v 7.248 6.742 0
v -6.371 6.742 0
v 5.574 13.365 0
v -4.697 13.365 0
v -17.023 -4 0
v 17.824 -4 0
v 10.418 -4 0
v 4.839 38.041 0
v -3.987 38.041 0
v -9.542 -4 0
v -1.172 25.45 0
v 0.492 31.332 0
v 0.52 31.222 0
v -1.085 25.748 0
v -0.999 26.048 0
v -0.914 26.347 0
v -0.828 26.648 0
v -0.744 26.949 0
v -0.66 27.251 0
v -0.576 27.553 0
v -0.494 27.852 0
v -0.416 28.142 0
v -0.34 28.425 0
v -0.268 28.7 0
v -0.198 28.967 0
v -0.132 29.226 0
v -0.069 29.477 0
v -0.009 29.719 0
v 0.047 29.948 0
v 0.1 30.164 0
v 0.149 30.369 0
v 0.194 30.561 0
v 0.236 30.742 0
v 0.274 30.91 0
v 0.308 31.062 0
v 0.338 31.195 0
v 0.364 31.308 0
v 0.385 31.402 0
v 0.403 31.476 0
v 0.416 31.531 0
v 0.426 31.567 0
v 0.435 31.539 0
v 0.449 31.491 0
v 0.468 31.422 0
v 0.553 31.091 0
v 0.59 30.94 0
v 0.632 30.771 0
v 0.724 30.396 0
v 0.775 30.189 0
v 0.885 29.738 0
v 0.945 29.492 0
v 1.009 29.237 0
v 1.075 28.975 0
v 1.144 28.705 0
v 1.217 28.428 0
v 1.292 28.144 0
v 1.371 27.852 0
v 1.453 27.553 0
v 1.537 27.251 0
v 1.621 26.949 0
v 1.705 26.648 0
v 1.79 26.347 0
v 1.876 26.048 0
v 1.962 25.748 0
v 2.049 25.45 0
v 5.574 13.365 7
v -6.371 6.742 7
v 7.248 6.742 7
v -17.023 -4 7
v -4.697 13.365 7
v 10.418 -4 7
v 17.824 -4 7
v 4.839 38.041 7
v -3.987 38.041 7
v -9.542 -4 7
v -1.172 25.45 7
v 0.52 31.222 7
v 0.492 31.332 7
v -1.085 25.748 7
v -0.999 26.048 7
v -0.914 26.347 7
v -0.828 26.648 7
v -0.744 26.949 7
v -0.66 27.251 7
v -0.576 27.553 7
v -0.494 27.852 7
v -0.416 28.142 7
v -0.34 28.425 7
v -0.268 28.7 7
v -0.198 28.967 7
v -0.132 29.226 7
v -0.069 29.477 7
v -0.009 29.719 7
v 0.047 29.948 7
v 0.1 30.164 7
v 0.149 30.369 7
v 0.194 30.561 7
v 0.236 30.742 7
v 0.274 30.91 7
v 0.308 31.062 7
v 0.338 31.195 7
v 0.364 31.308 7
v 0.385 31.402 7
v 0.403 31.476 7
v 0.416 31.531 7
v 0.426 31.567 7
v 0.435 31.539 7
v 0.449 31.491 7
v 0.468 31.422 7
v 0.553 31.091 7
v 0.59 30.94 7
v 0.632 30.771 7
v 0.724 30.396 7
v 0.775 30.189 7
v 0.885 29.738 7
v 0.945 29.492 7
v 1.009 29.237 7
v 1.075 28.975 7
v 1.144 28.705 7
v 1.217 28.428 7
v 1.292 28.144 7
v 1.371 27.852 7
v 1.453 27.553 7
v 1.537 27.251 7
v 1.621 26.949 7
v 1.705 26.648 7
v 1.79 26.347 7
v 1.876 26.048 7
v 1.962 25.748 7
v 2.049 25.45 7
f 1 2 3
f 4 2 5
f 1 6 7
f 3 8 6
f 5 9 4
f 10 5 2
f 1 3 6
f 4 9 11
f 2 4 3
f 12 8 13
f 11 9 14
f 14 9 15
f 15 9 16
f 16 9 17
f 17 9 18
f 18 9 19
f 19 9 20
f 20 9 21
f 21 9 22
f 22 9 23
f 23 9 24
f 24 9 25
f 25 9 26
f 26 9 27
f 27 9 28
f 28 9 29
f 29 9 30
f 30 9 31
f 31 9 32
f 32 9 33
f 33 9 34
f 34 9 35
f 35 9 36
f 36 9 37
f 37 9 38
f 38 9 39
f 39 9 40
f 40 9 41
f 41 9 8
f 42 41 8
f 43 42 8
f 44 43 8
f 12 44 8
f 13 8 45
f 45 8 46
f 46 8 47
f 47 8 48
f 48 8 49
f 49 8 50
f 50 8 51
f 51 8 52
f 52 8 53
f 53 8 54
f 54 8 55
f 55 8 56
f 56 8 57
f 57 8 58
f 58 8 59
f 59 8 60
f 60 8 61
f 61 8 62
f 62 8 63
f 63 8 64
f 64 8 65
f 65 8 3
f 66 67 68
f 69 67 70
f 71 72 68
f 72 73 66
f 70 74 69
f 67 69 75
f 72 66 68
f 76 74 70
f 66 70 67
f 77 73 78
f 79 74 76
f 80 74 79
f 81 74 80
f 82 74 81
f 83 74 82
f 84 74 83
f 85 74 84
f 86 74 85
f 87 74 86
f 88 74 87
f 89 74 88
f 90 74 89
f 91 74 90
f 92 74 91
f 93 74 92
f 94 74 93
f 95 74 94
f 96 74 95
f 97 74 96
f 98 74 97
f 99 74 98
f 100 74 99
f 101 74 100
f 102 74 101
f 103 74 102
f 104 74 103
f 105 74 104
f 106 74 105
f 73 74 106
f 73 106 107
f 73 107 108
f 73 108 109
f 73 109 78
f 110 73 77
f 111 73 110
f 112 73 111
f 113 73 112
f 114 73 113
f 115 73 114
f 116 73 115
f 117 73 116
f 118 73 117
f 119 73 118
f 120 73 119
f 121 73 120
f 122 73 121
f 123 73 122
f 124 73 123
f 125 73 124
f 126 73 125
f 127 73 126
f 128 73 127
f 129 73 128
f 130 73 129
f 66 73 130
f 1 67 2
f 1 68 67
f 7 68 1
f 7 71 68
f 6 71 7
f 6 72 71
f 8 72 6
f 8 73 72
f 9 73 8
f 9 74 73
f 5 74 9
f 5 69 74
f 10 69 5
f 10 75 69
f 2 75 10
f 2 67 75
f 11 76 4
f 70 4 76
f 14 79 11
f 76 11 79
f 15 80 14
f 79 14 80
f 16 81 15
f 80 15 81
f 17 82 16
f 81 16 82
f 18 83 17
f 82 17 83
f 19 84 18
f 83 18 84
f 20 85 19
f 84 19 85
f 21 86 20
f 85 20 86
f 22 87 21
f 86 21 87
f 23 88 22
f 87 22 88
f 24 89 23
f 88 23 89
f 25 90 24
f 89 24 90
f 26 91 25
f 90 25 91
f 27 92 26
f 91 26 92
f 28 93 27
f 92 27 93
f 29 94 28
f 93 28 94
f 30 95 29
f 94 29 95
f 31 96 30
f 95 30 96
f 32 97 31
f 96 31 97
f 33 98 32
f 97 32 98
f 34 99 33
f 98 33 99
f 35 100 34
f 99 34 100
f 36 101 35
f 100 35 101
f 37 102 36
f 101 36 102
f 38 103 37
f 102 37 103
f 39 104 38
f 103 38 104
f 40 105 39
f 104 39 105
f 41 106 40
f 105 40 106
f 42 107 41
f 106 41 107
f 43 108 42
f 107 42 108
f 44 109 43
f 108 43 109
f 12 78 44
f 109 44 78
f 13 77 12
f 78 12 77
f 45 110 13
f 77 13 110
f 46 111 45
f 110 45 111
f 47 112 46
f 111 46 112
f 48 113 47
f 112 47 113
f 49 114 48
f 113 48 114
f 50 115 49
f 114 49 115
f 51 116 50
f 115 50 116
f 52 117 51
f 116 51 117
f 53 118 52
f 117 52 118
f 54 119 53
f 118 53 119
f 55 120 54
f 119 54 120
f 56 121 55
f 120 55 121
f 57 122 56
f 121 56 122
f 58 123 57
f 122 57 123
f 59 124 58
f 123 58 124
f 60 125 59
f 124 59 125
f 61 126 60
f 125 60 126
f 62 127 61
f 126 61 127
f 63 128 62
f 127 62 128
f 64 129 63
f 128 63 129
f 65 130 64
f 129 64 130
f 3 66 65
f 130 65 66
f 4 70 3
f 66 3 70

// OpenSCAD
// file: glyph.scad
// glyph — the shared geometry of every letter in the set. Defines named geometry
// only, so it renders nothing on its own; each letter part includes it and calls
// letter(). Every dimension lives in ../../lib/common.scad.
//
// A LETTER IS NOTHING BUT A LETTER. No plinth, no tongue, no tab — it is the
// bare glyph, and it attaches by standing in the deck groove and resting on the
// groove's floor. Anything else on it would be a distraction on a learning toy.
//
// It is a flat plate of one thickness, printed face-down: no overhang anywhere,
// no supports, and the face on the bed comes out smoothest.
//
// TWO TRAPS WITH text():
//
//  * A missing font FALLS BACK SILENTLY — no warning, no error, just different
//    letters. "Liberation Sans" was the first choice here because OpenSCAD
//    bundles it; on macOS the bundled faces are not registered with fontconfig,
//    so it rendered the fallback face instead and nothing said so. To check a
//    font resolved, render a string with it and with a deliberately bogus name
//    and compare bounding boxes: identical means it fell back.
//  * `size` is not the cap height in general. For Helvetica Bold they coincide
//    (size 44 -> 44.0 mm cap), which is why letter_size reads as a height.
//    Change the font and re-measure.

include <../../lib/common.scad>

// The letter's outline, upright in the XY plane, ready to be extruded along Z
// (which is the letter's thickness, and the print's build axis).
//
//   y = 0   is the deck surface
//   y < 0   is the part standing down inside the groove. It reaches letter_bury,
//           which is where the tapered groove closes to letter_t — NOT the
//           groove's floor. The letter wedges; it never bottoms out.
module glyph_2d(ch) {
    intersection() {
        translate([0, -letter_bury])
            scale([letter_condense, 1])
                text(ch, size = letter_size, font = letter_font,
                     halign = "center", valign = "baseline");
        // Trimmed flat at the baseline. Round letters (O, C, G, S) overshoot the
        // baseline by design, and a letter standing on a convex curve rocks —
        // there is nothing to stop it leaning. The trim costs nothing visible
        // and gives every letter a flat foot on the groove floor.
        translate([-200, -letter_bury]) square([400, 400]);
    }
}

// One letter, in its print orientation: lying on its face, thickness up Z.
module letter(ch) {
    linear_extrude(letter_t) glyph_2d(ch);
}

// Where that letter sits once it is dropped into a chassis, for fit checks.
module letter_fitted(ch) {
    translate([0, letter_t/2, body_top]) rotate([90, 0, 0]) letter(ch);
}
// main file
// letter A — one part. See glyph.scad for the geometry and lib/common.scad for
// the dimensions. Prints lying on its face, exactly as exported: no supports.

include <glyph.scad>

letter("A");
